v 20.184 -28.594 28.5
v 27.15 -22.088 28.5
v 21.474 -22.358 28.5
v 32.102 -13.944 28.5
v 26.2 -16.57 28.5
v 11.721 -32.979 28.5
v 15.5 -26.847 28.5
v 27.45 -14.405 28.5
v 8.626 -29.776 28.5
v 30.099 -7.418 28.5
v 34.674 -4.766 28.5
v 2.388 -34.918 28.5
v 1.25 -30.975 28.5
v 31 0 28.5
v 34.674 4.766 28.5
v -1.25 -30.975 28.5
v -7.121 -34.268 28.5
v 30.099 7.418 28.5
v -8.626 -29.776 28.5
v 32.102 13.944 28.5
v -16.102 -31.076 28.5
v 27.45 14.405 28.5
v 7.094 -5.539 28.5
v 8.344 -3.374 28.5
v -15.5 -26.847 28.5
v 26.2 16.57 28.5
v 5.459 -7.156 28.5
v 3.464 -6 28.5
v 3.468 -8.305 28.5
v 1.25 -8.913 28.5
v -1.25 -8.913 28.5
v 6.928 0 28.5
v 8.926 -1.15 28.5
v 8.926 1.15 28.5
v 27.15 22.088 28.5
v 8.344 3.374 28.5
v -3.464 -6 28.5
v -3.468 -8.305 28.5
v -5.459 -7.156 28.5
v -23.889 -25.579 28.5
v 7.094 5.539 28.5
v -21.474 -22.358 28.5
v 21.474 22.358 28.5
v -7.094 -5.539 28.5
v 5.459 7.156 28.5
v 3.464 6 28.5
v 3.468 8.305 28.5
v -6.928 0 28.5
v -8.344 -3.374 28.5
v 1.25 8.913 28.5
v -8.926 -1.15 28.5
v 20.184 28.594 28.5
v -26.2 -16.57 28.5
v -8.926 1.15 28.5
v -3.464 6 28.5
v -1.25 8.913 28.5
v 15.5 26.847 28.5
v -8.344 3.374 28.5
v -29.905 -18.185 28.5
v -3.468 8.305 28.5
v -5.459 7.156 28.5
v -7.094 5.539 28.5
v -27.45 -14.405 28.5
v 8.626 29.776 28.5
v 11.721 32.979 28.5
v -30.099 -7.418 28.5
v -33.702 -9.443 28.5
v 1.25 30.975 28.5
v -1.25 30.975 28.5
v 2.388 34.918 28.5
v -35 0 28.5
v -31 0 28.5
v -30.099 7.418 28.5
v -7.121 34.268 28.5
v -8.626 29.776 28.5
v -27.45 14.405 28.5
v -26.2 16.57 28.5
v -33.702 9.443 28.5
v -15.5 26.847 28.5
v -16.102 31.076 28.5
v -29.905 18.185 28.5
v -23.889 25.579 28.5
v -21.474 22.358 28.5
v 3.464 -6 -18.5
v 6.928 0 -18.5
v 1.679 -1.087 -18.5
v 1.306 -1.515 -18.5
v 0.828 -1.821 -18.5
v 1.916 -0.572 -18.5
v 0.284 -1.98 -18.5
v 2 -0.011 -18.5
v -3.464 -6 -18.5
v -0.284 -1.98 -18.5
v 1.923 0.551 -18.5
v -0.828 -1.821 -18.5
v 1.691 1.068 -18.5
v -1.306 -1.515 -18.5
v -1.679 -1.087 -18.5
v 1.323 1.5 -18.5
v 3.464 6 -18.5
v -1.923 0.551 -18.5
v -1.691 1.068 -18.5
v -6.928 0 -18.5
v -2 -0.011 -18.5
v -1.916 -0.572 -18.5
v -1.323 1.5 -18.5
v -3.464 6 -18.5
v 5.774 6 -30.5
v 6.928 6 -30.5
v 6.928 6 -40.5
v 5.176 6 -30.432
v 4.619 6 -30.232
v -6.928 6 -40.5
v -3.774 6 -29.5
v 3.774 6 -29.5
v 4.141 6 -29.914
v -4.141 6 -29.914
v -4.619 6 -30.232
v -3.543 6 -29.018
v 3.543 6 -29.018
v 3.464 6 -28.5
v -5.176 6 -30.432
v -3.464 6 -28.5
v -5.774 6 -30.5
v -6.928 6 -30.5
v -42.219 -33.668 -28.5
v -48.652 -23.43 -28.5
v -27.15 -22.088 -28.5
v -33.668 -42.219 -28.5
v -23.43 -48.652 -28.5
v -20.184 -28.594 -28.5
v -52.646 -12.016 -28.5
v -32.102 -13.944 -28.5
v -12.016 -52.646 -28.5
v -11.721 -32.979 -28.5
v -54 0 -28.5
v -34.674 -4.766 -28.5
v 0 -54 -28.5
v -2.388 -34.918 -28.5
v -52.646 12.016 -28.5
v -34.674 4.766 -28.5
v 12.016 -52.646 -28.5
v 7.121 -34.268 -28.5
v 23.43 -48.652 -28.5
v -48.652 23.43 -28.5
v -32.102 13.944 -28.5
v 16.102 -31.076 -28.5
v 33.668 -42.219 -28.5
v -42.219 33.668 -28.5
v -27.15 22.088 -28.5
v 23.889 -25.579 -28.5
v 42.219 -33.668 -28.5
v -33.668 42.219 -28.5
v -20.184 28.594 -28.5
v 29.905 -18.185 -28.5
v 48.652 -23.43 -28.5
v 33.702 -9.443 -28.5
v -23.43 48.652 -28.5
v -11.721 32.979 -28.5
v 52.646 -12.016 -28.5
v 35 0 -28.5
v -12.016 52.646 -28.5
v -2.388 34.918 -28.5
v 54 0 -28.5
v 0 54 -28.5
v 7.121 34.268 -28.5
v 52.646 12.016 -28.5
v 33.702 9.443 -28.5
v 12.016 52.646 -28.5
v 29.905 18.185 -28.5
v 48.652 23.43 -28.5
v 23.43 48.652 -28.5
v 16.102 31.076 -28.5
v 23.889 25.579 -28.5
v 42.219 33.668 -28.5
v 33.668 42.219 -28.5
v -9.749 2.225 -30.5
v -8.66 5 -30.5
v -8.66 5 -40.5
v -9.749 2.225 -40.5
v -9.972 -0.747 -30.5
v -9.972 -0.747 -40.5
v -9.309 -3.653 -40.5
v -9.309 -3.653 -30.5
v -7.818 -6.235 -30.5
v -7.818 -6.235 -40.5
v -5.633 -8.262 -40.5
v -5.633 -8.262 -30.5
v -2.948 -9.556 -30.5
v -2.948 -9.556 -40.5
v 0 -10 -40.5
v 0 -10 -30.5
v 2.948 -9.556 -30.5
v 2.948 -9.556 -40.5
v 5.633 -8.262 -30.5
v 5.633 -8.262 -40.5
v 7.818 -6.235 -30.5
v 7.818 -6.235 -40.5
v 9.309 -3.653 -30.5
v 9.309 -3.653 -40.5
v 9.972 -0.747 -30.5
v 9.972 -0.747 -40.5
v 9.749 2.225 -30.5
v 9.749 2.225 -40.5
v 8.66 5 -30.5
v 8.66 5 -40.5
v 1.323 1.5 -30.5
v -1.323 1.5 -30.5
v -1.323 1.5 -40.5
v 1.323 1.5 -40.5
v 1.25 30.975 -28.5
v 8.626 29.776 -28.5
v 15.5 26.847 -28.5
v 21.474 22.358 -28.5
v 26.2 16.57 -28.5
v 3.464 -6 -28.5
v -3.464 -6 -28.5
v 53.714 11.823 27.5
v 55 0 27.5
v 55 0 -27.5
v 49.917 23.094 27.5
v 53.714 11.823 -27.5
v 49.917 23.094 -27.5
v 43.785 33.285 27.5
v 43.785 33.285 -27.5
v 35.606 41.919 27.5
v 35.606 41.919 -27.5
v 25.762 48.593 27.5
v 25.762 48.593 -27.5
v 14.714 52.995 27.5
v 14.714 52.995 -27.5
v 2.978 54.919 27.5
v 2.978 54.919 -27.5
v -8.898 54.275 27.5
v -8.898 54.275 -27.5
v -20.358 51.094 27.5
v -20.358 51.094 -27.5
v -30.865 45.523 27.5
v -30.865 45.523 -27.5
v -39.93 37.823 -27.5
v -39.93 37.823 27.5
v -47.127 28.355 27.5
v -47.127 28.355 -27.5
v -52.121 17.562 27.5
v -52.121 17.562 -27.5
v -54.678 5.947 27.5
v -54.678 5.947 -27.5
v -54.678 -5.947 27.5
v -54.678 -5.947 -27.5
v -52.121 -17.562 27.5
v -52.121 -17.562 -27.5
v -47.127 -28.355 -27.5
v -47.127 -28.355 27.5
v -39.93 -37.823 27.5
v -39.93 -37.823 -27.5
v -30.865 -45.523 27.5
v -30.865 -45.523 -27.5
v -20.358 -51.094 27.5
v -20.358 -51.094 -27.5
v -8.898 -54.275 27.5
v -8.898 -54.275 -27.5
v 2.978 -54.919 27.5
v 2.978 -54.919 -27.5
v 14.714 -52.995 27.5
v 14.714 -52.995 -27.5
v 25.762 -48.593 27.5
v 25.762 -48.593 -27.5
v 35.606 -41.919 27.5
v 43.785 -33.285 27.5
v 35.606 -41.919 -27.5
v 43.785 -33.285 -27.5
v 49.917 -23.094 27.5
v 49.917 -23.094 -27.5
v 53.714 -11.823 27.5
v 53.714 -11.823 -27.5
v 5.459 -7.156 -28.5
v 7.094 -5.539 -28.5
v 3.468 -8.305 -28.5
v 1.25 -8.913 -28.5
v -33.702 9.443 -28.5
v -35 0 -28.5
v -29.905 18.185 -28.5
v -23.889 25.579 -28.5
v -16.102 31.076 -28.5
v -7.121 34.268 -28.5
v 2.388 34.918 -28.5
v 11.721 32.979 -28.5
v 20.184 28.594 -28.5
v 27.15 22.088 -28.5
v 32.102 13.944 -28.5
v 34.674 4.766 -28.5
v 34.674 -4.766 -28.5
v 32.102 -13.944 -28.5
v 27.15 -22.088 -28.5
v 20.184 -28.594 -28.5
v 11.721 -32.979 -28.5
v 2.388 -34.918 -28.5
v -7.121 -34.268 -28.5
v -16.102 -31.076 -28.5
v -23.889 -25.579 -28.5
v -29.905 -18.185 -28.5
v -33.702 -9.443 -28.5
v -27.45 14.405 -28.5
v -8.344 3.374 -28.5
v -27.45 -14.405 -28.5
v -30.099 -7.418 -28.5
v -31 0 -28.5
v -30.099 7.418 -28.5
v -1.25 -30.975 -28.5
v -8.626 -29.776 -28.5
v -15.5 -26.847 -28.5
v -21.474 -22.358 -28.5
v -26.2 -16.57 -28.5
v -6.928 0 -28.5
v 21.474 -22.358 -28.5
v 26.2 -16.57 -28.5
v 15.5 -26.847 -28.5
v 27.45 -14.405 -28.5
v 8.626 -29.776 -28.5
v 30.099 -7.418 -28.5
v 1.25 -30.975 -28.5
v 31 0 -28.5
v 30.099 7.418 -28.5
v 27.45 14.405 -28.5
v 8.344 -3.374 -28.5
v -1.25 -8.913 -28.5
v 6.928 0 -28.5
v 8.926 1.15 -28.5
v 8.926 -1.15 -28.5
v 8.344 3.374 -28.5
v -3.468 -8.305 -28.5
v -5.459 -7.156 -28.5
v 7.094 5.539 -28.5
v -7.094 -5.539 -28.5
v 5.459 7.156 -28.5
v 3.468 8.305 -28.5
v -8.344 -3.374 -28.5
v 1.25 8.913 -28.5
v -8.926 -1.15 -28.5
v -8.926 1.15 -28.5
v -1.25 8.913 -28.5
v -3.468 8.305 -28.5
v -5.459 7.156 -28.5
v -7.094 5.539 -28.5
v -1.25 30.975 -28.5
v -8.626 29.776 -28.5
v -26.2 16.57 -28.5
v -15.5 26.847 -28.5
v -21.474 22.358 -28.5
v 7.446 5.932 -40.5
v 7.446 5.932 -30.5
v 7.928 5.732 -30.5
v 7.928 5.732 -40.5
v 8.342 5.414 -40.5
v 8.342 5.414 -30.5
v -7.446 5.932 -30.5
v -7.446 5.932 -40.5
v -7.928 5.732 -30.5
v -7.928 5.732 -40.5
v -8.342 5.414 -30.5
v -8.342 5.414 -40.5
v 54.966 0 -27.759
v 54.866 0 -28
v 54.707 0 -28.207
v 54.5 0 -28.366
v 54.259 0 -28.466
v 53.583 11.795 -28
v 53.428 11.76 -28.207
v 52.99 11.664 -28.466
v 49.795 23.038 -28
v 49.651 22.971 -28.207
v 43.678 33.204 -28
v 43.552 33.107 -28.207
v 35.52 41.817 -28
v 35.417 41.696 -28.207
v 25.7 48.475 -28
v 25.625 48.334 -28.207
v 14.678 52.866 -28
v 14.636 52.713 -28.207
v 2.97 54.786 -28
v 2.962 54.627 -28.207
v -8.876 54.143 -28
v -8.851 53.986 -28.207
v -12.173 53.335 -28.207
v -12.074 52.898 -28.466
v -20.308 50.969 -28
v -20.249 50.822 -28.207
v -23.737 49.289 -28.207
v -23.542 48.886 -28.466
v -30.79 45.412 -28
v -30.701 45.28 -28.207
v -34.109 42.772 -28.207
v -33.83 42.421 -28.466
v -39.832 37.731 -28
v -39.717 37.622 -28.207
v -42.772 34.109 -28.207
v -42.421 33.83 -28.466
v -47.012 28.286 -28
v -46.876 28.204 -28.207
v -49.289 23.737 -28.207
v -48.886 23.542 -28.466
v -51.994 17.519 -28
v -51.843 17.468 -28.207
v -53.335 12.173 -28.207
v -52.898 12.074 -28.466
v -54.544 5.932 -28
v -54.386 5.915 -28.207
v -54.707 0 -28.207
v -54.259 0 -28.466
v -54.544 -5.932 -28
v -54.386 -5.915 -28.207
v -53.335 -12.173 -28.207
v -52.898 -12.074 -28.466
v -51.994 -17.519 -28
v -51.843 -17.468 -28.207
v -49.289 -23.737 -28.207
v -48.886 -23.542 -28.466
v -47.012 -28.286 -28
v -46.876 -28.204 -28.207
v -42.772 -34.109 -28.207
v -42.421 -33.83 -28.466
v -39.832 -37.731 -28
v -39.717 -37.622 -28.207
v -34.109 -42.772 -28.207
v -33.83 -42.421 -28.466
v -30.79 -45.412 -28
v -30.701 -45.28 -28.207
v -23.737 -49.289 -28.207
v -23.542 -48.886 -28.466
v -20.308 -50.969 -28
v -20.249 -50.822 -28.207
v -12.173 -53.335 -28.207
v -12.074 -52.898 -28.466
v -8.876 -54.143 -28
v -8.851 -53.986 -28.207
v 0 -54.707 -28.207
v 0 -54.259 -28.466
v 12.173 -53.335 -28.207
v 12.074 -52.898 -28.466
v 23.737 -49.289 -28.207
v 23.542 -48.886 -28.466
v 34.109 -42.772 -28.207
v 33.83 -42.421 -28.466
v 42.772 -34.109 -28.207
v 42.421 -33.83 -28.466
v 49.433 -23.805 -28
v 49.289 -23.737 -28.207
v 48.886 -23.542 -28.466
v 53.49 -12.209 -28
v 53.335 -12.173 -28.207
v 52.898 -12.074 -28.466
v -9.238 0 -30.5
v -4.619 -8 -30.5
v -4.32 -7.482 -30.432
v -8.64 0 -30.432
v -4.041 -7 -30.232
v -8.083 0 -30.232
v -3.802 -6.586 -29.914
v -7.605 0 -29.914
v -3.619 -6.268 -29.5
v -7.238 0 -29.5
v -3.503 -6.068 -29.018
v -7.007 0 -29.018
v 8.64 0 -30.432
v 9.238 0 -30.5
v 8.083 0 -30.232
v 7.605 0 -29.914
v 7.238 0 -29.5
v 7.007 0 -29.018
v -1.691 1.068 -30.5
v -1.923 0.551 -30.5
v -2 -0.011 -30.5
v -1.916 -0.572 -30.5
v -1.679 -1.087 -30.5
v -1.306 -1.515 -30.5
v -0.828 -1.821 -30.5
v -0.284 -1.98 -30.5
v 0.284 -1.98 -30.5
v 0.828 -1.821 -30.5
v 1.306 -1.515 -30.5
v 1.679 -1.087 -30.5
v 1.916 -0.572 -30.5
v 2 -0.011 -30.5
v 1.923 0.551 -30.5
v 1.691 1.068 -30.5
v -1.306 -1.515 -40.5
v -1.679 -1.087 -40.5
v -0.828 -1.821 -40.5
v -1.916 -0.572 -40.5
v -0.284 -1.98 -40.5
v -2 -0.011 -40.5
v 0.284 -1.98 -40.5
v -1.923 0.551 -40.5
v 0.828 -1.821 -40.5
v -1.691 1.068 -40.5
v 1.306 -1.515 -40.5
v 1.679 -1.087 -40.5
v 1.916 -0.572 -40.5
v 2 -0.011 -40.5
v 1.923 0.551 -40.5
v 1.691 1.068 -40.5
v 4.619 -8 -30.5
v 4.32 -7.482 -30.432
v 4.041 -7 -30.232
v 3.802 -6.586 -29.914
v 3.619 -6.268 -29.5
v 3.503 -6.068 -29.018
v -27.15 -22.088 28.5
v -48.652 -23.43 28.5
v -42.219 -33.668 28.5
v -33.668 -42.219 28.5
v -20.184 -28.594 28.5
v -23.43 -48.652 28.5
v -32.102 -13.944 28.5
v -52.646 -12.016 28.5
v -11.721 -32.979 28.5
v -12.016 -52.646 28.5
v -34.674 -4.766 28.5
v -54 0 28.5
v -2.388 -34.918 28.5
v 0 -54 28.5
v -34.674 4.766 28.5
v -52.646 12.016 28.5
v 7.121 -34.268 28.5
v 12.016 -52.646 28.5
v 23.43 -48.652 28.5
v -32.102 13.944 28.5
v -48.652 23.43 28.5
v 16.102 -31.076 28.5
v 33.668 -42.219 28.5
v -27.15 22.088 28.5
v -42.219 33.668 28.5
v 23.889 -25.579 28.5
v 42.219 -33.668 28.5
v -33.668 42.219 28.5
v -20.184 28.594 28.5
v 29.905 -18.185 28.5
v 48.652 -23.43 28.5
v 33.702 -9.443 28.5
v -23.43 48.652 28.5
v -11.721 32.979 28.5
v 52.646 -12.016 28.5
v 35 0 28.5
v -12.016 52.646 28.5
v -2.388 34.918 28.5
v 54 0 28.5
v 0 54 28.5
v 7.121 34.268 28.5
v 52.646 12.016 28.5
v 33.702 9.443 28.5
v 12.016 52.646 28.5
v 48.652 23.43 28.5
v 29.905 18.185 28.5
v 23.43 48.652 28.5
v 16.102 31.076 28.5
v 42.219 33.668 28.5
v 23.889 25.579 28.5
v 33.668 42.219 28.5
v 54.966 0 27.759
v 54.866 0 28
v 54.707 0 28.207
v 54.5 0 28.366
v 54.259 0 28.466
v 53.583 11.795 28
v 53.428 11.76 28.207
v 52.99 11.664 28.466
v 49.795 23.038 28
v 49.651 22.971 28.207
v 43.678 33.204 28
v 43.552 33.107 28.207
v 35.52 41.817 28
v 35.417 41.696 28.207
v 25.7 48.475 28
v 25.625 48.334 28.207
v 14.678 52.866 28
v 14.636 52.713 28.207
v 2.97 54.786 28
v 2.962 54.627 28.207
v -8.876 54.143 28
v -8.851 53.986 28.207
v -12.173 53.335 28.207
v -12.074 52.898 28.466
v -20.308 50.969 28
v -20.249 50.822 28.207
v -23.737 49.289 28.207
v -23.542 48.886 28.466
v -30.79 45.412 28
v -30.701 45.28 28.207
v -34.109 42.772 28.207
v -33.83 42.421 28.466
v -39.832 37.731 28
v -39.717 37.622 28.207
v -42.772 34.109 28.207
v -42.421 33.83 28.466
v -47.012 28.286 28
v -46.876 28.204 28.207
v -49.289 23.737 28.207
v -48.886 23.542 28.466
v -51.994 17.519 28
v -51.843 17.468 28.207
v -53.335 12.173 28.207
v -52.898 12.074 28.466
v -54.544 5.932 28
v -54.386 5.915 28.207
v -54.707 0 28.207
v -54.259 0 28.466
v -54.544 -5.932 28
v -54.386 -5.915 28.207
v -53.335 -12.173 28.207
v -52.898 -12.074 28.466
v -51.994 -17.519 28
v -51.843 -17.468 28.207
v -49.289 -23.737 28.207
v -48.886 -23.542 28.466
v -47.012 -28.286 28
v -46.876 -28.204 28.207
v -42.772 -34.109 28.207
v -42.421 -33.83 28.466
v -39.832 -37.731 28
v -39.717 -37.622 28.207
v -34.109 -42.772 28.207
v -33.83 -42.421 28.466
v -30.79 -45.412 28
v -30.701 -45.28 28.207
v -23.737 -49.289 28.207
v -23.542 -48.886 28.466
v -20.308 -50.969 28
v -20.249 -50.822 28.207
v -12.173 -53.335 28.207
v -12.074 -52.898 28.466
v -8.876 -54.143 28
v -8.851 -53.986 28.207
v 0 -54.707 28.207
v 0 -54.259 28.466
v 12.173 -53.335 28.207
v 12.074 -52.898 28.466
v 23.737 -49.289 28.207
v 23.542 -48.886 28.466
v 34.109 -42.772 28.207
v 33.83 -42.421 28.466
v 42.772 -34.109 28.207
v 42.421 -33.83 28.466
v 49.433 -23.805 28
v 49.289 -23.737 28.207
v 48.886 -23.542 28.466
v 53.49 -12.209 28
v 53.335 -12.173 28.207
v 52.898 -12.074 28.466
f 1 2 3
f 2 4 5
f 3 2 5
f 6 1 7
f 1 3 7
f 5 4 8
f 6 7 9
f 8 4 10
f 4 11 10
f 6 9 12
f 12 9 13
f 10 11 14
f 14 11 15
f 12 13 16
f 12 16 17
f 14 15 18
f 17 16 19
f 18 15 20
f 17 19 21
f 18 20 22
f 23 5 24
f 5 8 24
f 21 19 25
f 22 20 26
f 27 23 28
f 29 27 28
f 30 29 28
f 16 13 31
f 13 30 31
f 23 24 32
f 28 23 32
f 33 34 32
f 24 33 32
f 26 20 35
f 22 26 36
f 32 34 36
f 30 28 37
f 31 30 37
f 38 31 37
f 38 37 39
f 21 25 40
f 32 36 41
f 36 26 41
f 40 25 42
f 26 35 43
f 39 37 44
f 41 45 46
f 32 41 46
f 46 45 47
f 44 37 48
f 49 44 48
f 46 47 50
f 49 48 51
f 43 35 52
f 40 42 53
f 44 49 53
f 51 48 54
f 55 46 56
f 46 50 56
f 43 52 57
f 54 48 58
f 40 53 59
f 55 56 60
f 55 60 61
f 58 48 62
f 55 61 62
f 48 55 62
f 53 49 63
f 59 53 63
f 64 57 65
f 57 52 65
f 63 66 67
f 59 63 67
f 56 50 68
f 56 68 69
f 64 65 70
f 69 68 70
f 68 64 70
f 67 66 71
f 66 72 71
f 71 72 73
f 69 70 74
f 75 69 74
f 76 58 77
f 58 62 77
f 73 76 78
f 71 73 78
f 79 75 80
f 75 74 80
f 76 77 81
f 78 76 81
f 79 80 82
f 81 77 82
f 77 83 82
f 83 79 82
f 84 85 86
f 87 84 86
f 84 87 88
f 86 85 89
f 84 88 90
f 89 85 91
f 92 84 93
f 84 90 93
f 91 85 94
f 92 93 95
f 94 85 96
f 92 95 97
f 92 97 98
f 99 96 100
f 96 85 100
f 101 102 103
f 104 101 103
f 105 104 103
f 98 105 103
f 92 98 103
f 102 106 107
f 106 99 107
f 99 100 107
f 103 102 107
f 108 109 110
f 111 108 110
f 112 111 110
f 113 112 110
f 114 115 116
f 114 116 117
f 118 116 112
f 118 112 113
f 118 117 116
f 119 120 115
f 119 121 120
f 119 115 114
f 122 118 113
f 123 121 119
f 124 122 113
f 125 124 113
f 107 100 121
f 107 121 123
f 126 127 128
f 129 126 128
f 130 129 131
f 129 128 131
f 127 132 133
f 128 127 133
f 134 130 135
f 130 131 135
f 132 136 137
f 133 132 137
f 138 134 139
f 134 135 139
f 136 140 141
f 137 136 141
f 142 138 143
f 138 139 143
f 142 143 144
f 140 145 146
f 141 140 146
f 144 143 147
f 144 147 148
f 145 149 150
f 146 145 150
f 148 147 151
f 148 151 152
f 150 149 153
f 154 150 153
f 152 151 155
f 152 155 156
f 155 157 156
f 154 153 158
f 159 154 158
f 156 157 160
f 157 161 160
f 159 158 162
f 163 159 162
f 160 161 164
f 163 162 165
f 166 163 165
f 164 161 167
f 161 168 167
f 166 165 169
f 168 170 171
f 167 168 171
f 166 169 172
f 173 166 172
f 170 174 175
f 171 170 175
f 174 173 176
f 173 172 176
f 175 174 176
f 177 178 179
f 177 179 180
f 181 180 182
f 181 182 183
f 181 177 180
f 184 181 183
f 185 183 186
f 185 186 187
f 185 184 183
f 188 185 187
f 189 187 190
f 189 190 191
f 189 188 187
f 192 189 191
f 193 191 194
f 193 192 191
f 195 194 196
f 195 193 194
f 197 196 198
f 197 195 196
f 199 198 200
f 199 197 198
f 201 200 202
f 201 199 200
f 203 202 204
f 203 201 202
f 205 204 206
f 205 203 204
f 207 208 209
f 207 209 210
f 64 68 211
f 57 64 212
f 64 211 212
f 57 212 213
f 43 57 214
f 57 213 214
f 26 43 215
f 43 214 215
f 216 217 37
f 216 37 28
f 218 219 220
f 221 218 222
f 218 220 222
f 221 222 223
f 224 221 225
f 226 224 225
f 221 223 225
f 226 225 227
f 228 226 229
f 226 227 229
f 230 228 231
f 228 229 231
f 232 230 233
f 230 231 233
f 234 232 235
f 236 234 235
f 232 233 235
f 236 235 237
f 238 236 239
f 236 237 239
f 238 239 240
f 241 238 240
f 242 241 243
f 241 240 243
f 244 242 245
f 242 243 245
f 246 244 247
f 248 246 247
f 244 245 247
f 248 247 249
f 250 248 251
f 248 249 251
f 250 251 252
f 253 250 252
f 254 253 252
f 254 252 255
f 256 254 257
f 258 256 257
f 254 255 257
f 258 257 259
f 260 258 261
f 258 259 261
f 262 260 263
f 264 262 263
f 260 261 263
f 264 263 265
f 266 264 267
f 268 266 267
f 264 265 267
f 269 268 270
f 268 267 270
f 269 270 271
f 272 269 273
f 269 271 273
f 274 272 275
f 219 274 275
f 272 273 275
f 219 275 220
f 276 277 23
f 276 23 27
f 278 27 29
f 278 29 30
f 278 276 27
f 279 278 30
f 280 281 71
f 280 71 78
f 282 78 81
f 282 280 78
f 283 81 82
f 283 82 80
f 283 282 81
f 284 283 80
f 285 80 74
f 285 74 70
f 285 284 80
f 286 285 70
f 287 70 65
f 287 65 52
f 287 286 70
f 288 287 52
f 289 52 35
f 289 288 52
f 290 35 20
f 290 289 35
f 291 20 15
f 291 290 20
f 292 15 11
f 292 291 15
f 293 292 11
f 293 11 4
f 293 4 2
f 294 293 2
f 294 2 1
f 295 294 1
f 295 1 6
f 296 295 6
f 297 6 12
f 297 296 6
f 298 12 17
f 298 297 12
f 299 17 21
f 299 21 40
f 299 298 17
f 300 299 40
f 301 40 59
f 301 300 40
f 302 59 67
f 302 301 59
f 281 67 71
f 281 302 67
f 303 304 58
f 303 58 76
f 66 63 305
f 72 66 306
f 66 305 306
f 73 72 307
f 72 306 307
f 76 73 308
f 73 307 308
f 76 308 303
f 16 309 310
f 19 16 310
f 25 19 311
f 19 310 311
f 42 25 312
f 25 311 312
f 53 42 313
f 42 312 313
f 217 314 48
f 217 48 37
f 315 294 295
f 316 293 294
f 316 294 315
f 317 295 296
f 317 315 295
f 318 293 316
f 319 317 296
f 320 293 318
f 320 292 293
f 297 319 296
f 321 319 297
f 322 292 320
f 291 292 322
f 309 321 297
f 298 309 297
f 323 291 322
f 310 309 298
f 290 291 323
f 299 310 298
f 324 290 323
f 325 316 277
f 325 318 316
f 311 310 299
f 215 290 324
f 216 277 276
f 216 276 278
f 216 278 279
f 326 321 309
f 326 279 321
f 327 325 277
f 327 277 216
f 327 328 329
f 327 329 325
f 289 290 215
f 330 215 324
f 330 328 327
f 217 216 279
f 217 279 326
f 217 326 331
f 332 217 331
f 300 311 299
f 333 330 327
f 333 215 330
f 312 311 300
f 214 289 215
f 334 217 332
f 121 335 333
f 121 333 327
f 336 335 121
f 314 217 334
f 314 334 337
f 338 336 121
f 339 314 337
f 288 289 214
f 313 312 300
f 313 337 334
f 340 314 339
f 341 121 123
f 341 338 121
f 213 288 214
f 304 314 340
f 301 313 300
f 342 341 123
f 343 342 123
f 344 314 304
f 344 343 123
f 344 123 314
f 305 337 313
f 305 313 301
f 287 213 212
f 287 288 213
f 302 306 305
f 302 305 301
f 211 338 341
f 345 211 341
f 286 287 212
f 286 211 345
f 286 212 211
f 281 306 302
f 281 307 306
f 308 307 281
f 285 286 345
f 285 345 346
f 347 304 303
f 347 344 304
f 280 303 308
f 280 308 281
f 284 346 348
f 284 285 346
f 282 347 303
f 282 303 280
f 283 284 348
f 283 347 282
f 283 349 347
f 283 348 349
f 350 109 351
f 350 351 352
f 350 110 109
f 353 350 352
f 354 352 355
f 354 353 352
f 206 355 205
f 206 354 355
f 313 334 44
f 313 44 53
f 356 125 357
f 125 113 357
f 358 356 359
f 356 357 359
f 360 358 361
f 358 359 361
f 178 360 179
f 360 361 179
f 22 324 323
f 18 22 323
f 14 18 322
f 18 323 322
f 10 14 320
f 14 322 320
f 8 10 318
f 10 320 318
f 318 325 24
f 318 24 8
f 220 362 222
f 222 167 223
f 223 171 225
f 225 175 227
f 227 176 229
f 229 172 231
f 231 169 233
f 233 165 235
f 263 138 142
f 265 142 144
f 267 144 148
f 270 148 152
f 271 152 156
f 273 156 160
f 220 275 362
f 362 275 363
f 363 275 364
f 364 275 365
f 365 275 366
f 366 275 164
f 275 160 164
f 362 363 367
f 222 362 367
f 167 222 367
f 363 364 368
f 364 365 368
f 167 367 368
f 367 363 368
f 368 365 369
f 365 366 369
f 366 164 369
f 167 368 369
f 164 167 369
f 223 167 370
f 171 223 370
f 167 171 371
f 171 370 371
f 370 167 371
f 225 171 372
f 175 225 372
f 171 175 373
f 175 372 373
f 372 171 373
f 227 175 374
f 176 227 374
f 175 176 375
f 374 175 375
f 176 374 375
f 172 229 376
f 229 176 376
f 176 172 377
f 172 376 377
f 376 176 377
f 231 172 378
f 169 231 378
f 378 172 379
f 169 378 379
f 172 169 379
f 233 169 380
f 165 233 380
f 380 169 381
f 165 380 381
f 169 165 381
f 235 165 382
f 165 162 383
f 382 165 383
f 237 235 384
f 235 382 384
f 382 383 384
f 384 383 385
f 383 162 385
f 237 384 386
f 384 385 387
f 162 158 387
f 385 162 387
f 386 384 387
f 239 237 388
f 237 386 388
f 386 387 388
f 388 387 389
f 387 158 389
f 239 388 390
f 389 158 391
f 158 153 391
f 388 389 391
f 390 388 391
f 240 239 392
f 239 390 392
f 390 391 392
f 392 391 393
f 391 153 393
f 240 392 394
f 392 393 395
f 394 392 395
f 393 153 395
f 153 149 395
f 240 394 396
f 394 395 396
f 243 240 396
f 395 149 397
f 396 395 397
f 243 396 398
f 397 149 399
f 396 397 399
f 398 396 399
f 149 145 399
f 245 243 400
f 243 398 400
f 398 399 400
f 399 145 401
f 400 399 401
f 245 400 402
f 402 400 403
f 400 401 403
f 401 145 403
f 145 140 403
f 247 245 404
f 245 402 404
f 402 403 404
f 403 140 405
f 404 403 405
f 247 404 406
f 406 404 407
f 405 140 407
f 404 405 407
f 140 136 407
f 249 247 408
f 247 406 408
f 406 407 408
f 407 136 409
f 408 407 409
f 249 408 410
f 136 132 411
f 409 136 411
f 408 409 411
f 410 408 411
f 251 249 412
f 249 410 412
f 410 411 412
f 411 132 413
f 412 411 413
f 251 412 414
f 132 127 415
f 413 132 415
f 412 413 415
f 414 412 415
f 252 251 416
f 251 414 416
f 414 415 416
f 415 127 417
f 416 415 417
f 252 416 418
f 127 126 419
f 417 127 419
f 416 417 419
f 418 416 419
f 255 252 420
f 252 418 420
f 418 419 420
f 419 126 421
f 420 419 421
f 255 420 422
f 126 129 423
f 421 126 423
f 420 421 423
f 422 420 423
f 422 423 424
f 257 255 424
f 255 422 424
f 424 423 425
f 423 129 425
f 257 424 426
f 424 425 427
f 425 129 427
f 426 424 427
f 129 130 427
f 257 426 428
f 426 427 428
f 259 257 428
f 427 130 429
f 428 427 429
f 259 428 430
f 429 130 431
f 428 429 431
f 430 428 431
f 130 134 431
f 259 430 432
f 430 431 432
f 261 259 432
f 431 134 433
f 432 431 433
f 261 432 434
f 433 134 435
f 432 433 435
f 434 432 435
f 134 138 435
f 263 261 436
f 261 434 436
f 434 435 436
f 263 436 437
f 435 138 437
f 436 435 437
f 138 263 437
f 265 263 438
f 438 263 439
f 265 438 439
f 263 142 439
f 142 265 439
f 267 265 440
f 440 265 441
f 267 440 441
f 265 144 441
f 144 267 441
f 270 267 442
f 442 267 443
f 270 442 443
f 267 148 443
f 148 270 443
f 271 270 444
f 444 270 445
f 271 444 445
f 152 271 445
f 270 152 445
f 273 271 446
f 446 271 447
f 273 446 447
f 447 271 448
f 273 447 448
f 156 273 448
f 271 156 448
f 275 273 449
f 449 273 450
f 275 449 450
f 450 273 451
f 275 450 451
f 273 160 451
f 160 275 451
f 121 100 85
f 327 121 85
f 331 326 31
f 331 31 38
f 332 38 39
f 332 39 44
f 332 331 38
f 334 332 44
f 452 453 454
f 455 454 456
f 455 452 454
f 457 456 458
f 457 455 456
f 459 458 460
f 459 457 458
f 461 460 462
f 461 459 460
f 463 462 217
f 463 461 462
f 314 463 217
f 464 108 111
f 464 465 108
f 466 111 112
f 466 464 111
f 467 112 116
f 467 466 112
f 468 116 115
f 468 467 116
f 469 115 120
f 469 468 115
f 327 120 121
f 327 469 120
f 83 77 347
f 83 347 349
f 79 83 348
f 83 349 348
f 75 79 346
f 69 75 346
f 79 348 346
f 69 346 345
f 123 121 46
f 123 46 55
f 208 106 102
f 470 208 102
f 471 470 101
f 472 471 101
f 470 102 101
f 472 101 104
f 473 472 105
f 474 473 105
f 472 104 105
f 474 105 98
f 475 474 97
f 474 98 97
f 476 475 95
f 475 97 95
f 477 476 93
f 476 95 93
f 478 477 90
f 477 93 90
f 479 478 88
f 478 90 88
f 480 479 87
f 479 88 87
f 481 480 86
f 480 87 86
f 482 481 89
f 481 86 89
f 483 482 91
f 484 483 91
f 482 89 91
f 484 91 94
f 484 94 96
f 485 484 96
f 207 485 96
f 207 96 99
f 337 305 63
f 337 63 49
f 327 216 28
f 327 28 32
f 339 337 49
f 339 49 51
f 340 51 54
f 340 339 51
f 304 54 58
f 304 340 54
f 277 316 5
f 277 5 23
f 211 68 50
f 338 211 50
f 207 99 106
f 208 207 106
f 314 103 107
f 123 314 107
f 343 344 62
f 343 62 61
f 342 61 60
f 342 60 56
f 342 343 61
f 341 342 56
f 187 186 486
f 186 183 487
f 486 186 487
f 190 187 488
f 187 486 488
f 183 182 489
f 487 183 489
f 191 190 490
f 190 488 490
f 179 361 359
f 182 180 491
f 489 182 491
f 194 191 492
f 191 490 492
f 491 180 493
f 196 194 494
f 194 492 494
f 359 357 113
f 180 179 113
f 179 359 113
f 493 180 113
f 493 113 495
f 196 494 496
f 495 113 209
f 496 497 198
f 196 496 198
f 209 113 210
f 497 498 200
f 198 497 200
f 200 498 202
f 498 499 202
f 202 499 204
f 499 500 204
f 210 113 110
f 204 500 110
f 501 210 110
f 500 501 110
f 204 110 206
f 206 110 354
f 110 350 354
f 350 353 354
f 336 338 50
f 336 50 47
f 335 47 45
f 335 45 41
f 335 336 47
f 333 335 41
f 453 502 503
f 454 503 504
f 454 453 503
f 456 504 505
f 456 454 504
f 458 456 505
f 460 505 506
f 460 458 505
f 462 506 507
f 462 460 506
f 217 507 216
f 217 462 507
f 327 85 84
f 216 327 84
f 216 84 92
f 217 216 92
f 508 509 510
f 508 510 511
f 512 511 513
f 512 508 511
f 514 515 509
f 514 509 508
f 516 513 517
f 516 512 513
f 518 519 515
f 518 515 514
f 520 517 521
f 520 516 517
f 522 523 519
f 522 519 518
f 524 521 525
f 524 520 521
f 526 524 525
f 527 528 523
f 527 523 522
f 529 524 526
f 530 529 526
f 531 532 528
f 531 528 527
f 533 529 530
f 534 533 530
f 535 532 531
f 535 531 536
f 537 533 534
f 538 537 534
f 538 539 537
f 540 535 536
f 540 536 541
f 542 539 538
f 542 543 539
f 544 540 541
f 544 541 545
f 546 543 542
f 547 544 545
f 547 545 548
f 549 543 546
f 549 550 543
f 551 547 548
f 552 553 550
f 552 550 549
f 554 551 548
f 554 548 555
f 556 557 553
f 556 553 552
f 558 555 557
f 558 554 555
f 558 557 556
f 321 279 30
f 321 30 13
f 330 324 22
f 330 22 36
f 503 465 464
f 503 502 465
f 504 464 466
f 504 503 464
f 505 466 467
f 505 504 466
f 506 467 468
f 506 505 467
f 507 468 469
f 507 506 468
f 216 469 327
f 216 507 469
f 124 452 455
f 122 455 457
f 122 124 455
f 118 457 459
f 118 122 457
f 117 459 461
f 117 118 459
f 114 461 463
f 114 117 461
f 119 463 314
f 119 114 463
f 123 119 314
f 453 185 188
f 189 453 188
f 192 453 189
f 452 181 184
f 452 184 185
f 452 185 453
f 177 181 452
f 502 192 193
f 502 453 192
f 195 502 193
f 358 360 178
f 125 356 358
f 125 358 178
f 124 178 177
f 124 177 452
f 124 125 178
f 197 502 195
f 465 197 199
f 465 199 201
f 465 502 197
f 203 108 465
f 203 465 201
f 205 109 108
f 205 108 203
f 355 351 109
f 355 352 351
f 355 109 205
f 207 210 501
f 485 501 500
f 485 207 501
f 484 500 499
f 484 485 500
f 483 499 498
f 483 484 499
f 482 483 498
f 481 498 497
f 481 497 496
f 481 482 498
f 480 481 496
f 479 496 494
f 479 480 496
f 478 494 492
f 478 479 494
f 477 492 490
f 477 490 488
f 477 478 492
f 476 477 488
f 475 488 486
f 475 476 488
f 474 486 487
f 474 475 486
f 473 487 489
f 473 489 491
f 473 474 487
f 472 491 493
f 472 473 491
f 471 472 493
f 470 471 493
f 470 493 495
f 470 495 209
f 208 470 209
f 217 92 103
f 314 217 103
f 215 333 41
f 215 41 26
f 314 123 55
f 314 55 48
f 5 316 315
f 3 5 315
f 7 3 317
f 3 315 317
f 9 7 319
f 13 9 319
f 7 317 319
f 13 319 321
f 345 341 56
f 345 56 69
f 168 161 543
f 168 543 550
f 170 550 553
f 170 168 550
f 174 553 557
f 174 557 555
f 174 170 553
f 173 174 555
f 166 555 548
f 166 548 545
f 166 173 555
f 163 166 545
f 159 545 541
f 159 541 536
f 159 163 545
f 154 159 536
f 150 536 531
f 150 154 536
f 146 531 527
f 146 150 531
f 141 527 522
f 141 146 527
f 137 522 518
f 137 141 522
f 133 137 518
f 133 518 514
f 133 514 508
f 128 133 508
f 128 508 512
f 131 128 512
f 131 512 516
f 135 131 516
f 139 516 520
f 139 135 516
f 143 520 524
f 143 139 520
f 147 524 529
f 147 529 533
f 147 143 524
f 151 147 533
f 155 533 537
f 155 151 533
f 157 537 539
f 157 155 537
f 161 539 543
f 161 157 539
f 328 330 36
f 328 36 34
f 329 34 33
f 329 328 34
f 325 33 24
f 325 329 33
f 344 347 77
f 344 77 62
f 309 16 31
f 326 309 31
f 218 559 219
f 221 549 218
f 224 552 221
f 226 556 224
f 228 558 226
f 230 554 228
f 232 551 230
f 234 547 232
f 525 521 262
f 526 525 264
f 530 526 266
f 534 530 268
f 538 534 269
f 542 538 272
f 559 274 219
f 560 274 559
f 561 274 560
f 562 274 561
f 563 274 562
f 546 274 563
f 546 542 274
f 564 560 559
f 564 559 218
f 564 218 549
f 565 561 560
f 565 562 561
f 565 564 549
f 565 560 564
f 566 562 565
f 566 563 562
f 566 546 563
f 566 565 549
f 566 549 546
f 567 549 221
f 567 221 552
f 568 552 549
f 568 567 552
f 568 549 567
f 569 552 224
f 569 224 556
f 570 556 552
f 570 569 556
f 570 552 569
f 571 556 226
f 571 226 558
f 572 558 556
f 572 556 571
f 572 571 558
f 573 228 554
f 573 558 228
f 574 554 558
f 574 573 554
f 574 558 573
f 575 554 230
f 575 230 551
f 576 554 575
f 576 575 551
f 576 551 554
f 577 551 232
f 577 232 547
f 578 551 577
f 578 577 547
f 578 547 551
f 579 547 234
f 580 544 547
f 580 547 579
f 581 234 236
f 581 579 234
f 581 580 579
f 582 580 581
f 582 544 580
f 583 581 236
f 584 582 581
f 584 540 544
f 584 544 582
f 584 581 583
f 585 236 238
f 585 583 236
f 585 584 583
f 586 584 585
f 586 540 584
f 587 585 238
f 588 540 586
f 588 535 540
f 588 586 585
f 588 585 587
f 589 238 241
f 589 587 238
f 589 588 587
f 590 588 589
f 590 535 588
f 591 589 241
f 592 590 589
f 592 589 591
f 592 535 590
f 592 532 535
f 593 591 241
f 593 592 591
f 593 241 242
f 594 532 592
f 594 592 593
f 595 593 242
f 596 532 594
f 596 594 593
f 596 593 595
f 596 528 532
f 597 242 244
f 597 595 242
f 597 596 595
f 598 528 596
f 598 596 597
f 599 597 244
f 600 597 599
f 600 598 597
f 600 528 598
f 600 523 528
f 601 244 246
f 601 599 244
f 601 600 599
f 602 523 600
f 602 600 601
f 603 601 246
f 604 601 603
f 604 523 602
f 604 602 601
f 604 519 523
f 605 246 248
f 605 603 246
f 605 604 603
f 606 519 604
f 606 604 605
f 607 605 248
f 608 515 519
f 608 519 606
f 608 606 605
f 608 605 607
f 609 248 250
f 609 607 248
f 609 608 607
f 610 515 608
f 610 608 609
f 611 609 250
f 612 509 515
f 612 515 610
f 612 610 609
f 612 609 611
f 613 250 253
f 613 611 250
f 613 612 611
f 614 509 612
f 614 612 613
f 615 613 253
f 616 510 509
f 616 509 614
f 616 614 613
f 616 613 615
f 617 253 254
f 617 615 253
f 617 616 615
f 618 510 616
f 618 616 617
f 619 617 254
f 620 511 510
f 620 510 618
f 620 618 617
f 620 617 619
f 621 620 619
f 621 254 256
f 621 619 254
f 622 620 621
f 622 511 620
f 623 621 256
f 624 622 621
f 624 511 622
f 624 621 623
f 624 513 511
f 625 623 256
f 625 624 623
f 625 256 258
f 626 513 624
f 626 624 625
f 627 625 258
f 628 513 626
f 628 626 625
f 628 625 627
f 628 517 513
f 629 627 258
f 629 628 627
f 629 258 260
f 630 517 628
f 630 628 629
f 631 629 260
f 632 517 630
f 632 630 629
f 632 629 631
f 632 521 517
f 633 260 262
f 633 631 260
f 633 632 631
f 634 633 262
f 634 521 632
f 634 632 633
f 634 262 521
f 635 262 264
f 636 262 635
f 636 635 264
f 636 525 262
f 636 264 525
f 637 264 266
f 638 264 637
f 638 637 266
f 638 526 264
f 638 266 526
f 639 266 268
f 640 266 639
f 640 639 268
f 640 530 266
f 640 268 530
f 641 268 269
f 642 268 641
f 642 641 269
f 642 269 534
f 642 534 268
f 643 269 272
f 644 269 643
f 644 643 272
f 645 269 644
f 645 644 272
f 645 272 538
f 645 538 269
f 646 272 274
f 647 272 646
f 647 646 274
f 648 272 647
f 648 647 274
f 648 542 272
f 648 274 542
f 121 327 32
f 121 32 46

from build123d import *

# Parameters (mm, degrees)
EXTRUDE_1_DEPTH      = 28.5
EXTRUDE_1_DEPTH_BACK = 28.5
SKETCH_1_R           = 55
SKETCH_1_R_2         = 35
FILLET_1_R           = 1
SKETCH_2_R           = 35
SKETCH_2_R_2         = 31
EXTRUDE_2_DEPTH      = 57
EXTRUDE_3_DEPTH      = 57
EXTRUDE_4_DEPTH      = 2
EXTRUDE_4_DEPTH_BACK = 10
EXTRUDE_5_DEPTH      = 10
FILLET_2_R           = 2
FILLET_3_R           = 2


with BuildPart() as part:
    # ｽｹｯﾁ1 → ﾎﾞｽ - 押し出し1 (new, two sides: drawn at the far end of the back side and taken through both)
    with BuildSketch(Plane.XY.offset(-EXTRUDE_1_DEPTH_BACK)):
        Circle(SKETCH_1_R)
        Circle(SKETCH_1_R_2, mode=Mode.SUBTRACT)
    extrude(amount=EXTRUDE_1_DEPTH + EXTRUDE_1_DEPTH_BACK)

    # ﾌｨﾚｯﾄ1
    fillet_1_edges = [part.edges().sort_by_distance(p)[0] for p in [
        (-55, 0, -28.5),
        (-55, 0, 28.5),
    ]]
    fillet(fillet_1_edges, radius=FILLET_1_R)


with BuildPart() as body_2:
    # ｽｹｯﾁ2 → ﾎﾞｽ - 押し出し2 (new body)
    with BuildSketch(Plane(origin=(0, 0, -28.5), x_dir=(-1, 0, 0), z_dir=(0, 0, -1))):
        Circle(SKETCH_2_R)
        Circle(SKETCH_2_R_2, mode=Mode.SUBTRACT)
    extrude(amount=-EXTRUDE_2_DEPTH)

    # ｽｹｯﾁ3 → ﾎﾞｽ - 押し出し3 (add)
    with BuildSketch(Plane(origin=(0, 0, -28.5), x_dir=(-1, 0, 0), z_dir=(0, 0, -1))):
        with BuildLine():
            ThreePointArc((1.25, 30.974788135), (0, 31), (-1.25, 30.974788135))
            Line((-1.25, 30.974788135), (-1.25, 8.912771735))
            ThreePointArc((-1.25, 8.912771735), (-4.5, 7.794228634), (-7.093686741, 5.538917622))
            Line((-7.093686741, 5.538917622), (-26.199953402, 16.569925822))
            ThreePointArc((-26.199953402, 16.569925822), (-26.846787517, 15.5), (-27.449953402, 14.404862313))
            Line((-27.449953402, 14.404862313), (-8.343686741, 3.373854113))
            ThreePointArc((-8.343686741, 3.373854113), (-9, 0), (-8.343686741, -3.373854113))
            Line((-8.343686741, -3.373854113), (-27.449953402, -14.404862313))
            ThreePointArc((-27.449953402, -14.404862313), (-26.846787517, -15.5), (-26.199953402, -16.569925822))
            Line((-26.199953402, -16.569925822), (-7.093686741, -5.538917622))
            ThreePointArc((-7.093686741, -5.538917622), (-4.5, -7.794228634), (-1.25, -8.912771735))
            Line((-1.25, -8.912771735), (-1.25, -30.974788135))
            ThreePointArc((-1.25, -30.974788135), (0, -31), (1.25, -30.974788135))
            Line((1.25, -30.974788135), (1.25, -8.912771735))
            ThreePointArc((1.25, -8.912771735), (4.5, -7.794228634), (7.093686741, -5.538917622))
            Line((7.093686741, -5.538917622), (26.199953402, -16.569925822))
            ThreePointArc((26.199953402, -16.569925822), (26.846787517, -15.5), (27.449953402, -14.404862313))
            Line((27.449953402, -14.404862313), (8.343686741, -3.373854113))
            ThreePointArc((8.343686741, -3.373854113), (9, 0), (8.343686741, 3.373854113))
            Line((8.343686741, 3.373854113), (27.449953402, 14.404862313))
            ThreePointArc((27.449953402, 14.404862313), (26.846787517, 15.5), (26.199953402, 16.569925822))
            Line((26.199953402, 16.569925822), (7.093686741, 5.538917622))
            ThreePointArc((7.093686741, 5.538917622), (4.5, 7.794228634), (1.25, 8.912771735))
            Line((1.25, 8.912771735), (1.25, 30.974788135))
        make_face()
        Polygon((-3.464101615, 6), (3.464101615, 6), (6.92820323, 0), (3.464101615, -6), (-3.464101615, -6), (-6.92820323, 0), align=None, mode=Mode.SUBTRACT)
    extrude(amount=-EXTRUDE_3_DEPTH)


with BuildPart() as body_3:
    # ｽｹｯﾁ4 → ﾎﾞｽ - 押し出し4 (new, two sides: drawn at the far end of the back side and taken through both)
    with BuildSketch(Plane(origin=(0, 0, -28.5), x_dir=(-1, 0, 0), z_dir=(0, 0, -1)).offset(-EXTRUDE_4_DEPTH_BACK)):
        Polygon((-3.464101615, 6), (-6.92820323, 0), (-3.464101615, -6), (3.464101615, -6), (6.92820323, 0), (3.464101615, 6), align=None)
        with BuildLine():
            Line((-1.322875656, 1.5), (1.322875656, 1.5))
            ThreePointArc((1.322875656, 1.5), (0, -2), (-1.322875656, 1.5))
        make_face(mode=Mode.SUBTRACT)
    extrude(amount=EXTRUDE_4_DEPTH + EXTRUDE_4_DEPTH_BACK)

    # ｽｹｯﾁ7 → ﾎﾞｽ - 押し出し5 (add)
    with BuildSketch(Plane(origin=(0, 0, -30.5), x_dir=(-1, 0, 0), z_dir=(0, 0, -1))):
        with BuildLine():
            Line((-8, 6), (8, 6))
            ThreePointArc((8, 6), (0, -10), (-8, 6))
        make_face()
        with BuildLine():
            Line((1.322875656, 1.5), (-1.322875656, 1.5))
            ThreePointArc((-1.322875656, 1.5), (0, -2), (1.322875656, 1.5))
        make_face(mode=Mode.SUBTRACT)
    extrude(amount=EXTRUDE_5_DEPTH)

    # ﾌｨﾚｯﾄ2
    fillet_2_edges = [body_3.edges().sort_by_distance(p)[0] for p in [
        (5.196152423, -3, -30.5),
        (0, -6, -30.5),
        (-5.196152423, -3, -30.5),
        (-5.196152423, 3, -30.5),
        (5.196152423, 3, -30.5),
    ]]
    fillet(fillet_2_edges, radius=FILLET_2_R)

    # ﾌｨﾚｯﾄ3
    fillet_3_edges = [body_3.edges().sort_by_distance(p)[0] for p in [
        (8, 6, -35.5),
        (-8, 6, -35.5),
    ]]
    fillet(fillet_3_edges, radius=FILLET_3_R)


solid = Compound([part.part, body_2.part, body_3.part])
